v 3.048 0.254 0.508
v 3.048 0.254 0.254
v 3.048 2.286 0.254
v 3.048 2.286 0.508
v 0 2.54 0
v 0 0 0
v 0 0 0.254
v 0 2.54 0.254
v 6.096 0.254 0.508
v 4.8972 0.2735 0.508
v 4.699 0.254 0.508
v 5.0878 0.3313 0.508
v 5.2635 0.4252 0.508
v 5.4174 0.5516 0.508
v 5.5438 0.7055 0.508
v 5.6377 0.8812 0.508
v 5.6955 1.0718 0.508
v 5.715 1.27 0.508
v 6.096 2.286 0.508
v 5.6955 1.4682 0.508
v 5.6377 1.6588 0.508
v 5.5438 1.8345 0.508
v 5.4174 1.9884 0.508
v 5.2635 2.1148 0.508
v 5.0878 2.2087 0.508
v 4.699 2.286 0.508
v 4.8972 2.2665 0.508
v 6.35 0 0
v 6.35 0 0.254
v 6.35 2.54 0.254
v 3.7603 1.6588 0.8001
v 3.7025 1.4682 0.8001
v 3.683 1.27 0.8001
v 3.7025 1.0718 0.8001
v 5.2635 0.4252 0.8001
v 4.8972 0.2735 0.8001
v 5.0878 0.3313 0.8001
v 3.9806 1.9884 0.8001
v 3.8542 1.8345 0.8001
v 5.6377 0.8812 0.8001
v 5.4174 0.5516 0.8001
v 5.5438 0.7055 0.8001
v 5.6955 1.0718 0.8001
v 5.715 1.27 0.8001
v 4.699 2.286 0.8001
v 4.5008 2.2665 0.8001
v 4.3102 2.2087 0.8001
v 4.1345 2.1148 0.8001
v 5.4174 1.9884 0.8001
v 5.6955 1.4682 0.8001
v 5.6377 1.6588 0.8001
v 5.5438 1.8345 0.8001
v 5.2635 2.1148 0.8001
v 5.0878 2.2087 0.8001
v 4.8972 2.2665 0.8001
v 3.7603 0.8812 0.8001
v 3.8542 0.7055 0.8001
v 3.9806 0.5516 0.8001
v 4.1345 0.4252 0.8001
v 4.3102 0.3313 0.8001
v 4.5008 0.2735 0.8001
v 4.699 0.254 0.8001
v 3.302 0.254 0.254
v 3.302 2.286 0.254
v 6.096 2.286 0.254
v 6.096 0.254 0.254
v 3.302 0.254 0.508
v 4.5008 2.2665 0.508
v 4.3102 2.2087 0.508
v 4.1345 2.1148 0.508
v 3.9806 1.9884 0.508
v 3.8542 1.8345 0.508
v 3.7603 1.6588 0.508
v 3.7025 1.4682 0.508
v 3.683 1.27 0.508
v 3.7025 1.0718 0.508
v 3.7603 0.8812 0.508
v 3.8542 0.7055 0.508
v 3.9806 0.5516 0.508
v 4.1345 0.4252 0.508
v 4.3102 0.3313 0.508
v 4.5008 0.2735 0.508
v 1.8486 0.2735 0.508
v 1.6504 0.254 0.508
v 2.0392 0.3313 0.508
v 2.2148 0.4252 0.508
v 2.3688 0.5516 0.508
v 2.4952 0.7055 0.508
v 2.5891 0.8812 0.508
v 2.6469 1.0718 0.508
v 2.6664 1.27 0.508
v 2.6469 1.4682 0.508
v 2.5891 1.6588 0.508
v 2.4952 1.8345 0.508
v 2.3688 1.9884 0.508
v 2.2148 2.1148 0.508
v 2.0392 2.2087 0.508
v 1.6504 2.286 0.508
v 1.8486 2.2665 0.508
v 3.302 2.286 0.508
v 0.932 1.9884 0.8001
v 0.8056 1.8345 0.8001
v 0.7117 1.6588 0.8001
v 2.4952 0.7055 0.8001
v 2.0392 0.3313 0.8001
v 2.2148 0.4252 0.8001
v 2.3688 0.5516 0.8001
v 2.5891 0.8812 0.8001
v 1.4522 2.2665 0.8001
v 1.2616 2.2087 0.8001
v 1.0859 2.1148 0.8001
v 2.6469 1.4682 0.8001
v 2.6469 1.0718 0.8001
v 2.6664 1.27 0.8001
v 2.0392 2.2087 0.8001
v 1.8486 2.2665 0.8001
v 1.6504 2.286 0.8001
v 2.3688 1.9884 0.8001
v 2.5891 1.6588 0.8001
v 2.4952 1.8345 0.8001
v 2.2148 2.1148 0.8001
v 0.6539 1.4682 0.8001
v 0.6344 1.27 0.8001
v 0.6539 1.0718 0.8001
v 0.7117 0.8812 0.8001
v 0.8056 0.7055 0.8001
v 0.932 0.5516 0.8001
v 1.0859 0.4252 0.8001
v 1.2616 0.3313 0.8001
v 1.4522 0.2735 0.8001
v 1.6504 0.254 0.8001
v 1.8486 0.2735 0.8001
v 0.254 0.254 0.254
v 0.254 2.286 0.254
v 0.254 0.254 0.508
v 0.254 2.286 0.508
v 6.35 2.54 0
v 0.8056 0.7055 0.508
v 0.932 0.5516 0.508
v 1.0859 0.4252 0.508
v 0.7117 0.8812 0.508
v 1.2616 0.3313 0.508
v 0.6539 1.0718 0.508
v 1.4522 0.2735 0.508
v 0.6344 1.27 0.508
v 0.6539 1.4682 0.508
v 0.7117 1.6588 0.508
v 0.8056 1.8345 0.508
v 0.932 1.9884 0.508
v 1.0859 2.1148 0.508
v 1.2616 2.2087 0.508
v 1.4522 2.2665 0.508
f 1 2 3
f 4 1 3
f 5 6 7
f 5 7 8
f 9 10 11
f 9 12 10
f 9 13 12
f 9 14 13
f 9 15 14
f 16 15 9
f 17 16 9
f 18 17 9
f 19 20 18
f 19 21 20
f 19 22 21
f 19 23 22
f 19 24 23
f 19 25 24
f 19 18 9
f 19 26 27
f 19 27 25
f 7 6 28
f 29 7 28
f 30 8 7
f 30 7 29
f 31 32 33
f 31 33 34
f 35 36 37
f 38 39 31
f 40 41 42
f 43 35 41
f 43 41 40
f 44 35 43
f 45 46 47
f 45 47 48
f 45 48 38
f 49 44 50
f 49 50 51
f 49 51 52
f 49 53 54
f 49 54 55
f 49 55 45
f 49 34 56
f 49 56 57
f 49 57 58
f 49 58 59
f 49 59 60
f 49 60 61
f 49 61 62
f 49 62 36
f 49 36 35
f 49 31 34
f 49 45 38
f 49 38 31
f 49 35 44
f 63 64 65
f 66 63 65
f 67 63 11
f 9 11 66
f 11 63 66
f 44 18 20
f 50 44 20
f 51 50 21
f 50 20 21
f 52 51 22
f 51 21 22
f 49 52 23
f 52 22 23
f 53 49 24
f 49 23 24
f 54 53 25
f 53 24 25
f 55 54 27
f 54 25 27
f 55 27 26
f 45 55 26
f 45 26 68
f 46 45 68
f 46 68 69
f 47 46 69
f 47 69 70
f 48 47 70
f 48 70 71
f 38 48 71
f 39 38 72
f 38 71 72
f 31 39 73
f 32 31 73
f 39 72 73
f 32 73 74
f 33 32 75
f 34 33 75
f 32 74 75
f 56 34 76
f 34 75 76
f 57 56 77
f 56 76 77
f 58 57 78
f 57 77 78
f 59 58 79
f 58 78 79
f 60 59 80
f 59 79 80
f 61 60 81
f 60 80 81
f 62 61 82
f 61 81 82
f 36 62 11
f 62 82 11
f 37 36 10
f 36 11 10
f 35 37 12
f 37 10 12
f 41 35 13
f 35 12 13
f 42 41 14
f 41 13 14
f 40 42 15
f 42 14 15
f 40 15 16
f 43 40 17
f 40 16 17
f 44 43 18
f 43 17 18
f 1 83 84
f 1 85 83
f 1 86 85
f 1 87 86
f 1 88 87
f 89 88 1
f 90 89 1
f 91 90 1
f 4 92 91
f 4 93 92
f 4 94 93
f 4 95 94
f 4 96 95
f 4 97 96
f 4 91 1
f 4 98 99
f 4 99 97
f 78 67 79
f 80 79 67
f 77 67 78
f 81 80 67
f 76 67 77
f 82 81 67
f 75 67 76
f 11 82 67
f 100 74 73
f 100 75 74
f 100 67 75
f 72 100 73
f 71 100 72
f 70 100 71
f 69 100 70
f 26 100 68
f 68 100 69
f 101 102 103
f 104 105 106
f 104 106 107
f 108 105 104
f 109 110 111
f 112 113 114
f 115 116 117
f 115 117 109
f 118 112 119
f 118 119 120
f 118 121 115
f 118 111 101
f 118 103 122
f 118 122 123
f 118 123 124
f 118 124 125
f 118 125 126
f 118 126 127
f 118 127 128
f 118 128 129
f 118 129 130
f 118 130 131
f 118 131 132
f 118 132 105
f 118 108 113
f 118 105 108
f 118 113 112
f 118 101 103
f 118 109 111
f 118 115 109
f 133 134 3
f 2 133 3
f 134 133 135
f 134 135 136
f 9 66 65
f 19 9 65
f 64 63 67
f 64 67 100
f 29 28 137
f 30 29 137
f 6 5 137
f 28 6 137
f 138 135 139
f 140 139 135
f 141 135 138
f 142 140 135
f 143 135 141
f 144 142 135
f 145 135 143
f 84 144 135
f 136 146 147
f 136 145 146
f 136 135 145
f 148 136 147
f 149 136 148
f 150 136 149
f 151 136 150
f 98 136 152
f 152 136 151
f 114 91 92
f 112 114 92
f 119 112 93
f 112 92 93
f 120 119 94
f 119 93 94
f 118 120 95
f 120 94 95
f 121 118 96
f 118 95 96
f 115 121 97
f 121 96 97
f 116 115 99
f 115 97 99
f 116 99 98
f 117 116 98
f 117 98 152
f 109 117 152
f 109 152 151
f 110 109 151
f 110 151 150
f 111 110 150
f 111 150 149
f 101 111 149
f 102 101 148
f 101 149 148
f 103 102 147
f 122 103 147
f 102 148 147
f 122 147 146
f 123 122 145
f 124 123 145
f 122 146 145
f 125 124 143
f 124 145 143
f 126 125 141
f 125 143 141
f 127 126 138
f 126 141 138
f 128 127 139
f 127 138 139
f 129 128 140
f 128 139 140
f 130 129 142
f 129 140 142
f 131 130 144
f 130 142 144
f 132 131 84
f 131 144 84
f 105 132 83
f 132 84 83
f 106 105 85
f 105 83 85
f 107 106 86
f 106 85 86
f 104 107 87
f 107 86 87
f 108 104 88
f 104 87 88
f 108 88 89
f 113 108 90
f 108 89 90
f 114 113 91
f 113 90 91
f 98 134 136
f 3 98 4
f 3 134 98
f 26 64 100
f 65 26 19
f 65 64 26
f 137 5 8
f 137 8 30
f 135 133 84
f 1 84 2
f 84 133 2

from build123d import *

# Parameters (mm, degrees)
SKETCH1_W             = 6.35
SKETCH1_H             = 2.54
BOSS_EXTRUDE1_DEPTH   = 0.254
SKETCH2_W             = 2.794
SKETCH2_H             = 2.032
BOSS_EXTRUDE3_DEPTH   = 0.254
BOSS_EXTRUDE3_2_DEPTH = 0.254
SKETCH4_R             = 1.016
BOSS_EXTRUDE4_DEPTH   = 0.2921
SKETCH5_R             = 1.016
BOSS_EXTRUDE5_DEPTH   = 0.2921


with BuildPart() as part:
    # Sketch1 → Boss-Extrude1 (new body)
    with BuildSketch(Plane.XY):
        with Locations((3.175, 1.27)):
            Rectangle(SKETCH1_W, SKETCH1_H)
    extrude(amount=BOSS_EXTRUDE1_DEPTH)


with BuildPart() as body_2:
    # Sketch2 → Boss-Extrude3 (new body)
    with BuildSketch(Plane.XY.offset(0.254)):
        with Locations((1.651, 1.27)):
            Rectangle(SKETCH2_W, SKETCH2_H)
    extrude(amount=BOSS_EXTRUDE3_DEPTH)

    # Sketch4 → Boss-Extrude4 (add)
    with BuildSketch(Plane.XY.offset(0.508)):
        with Locations((1.650390219, 1.27)):
            Circle(SKETCH4_R)
    extrude(amount=BOSS_EXTRUDE4_DEPTH)


with BuildPart() as body_3:
    # Sketch2 → Boss-Extrude3 2 (new body)
    with BuildSketch(Plane.XY.offset(0.254)):
        with Locations((4.699, 1.27)):
            Rectangle(SKETCH2_W, SKETCH2_H)
    extrude(amount=BOSS_EXTRUDE3_2_DEPTH)

    # Sketch5 → Boss-Extrude5 (add)
    with BuildSketch(Plane.XY.offset(0.508)):
        with Locations((4.699, 1.27)):
            Circle(SKETCH5_R)
    extrude(amount=BOSS_EXTRUDE5_DEPTH)


solid = Compound([part.part, body_2.part, body_3.part])
